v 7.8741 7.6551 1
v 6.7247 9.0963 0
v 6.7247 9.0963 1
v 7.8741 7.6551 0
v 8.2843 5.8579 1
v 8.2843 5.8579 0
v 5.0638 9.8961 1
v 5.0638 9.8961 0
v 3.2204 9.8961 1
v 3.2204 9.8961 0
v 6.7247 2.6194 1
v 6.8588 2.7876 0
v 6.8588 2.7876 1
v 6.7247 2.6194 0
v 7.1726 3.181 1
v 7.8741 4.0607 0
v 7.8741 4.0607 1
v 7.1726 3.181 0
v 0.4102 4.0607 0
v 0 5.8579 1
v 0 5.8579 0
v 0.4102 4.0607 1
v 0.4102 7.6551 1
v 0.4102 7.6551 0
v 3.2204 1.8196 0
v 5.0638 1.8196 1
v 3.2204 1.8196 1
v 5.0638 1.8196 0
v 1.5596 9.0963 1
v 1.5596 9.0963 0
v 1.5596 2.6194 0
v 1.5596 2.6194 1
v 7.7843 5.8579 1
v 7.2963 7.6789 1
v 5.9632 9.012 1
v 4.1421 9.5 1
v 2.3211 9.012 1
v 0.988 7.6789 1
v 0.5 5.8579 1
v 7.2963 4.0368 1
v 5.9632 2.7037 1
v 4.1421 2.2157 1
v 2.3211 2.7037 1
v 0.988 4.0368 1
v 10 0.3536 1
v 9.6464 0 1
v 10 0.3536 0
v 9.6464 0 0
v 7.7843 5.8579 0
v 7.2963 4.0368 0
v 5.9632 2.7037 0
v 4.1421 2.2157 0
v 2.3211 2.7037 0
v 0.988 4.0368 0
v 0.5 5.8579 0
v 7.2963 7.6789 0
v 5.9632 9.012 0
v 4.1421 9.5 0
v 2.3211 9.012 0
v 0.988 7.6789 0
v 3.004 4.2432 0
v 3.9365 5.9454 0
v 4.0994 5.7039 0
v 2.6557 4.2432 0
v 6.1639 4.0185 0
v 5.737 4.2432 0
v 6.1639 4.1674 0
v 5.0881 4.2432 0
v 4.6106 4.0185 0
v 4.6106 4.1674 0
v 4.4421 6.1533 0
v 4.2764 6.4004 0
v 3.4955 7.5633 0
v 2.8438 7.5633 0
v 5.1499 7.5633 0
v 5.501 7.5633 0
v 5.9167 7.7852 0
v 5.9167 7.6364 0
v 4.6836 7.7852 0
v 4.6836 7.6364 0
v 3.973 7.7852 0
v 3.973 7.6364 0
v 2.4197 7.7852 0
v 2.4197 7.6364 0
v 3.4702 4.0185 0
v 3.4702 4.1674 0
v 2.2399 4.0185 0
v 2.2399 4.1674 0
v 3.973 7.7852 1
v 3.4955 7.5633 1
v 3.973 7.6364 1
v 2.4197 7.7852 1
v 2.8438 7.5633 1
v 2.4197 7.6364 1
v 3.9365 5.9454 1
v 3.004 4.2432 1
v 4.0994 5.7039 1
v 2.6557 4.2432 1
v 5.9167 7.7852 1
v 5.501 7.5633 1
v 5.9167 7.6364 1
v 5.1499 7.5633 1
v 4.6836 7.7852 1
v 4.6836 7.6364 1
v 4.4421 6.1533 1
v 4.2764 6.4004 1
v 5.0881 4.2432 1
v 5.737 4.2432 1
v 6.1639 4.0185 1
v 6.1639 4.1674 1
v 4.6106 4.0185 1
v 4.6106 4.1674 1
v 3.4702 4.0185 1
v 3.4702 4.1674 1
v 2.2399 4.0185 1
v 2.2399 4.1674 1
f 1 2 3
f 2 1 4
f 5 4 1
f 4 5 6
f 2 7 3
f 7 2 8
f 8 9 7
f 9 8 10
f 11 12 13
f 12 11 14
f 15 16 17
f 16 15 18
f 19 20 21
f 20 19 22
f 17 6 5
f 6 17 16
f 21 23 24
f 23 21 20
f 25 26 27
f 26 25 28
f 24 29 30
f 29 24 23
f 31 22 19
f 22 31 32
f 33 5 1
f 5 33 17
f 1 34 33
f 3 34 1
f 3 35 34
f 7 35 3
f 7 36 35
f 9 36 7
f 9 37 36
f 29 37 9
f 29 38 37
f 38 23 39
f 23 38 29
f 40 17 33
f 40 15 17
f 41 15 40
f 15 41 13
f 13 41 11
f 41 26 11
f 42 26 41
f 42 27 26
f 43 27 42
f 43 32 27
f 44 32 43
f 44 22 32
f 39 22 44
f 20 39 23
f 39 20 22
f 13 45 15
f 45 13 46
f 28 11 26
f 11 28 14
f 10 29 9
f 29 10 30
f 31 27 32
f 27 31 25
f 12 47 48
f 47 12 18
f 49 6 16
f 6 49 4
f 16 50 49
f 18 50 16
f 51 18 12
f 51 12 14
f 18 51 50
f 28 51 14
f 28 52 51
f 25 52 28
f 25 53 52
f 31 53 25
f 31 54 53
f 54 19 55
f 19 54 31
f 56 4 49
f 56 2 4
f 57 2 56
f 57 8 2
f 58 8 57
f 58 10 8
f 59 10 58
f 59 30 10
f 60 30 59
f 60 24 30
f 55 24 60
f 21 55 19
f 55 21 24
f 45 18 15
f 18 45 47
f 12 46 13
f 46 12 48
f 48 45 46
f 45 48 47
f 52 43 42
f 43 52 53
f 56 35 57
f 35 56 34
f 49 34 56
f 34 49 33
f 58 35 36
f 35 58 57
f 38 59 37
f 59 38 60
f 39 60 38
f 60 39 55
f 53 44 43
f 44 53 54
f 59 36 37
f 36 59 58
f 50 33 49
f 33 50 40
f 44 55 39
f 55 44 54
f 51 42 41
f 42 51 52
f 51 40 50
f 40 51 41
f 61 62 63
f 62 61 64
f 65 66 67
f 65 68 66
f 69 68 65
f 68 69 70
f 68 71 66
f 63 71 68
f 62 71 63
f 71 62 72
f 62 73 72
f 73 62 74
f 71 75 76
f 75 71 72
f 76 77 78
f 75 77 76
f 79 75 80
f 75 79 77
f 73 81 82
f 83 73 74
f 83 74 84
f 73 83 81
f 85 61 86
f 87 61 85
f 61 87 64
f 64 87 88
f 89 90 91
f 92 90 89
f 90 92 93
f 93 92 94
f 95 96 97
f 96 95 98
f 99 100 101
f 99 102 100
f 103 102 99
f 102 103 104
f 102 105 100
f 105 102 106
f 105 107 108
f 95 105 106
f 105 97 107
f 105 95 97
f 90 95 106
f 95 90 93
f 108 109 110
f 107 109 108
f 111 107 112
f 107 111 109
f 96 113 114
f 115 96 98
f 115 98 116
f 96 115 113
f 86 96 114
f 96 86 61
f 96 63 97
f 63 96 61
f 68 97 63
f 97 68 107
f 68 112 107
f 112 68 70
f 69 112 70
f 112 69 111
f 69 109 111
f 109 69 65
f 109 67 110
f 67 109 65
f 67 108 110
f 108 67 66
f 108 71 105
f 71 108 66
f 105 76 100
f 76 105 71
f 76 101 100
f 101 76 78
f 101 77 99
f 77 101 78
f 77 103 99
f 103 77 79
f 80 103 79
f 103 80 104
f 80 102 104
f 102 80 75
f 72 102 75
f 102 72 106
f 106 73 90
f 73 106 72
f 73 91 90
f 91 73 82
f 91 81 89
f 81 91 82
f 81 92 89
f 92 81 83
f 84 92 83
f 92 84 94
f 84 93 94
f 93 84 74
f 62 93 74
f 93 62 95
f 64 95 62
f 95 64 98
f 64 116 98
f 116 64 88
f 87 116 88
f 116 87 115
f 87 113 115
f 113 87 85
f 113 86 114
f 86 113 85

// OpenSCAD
// draws a magnifying glass
// parameters:
// text - one character as a string
// size - size of the symbol
// line_width - width of the drawing line
// height - height of the symbol (Z axis)
// centerX - if true, center horizontally
// centerY - if true, center vertically
// center - if true, center both horizontally and vertically
module magnifying_glass(text="X", size=10, line_width=0.5 ,height = 1, center=false, centerX=false, centerY=false) {
    
    r = size/(1+2*cos(45));
    x = cos(45)/2*(r+line_width) ;
    f = line_width*sin(45)/2;
    
    translate([(center || centerX) ? -size/2: 0, (center || centerY) ? -size/2:0,0]) {
        difference() {
           union() { 
              translate([r, size-r, 0]) 
                 cylinder(h=height, r= r);
                  
              translate([size-x-f, x+f,height/2])
                 rotate([0,0,45])
                     cube([line_width, r+line_width, height], center=true);
              
              
           };
           
           translate([r, size-r, -1]) 
              cylinder(h=height+2, r=(r-line_width)); 
        } // difference
        
        translate([r, size-r, 0])
        linear_extrude(height=height)
           text(text=text, halign="center", valign="center", size=r, font="Times New Roman"); 
  }
}

magnifying_glass();
